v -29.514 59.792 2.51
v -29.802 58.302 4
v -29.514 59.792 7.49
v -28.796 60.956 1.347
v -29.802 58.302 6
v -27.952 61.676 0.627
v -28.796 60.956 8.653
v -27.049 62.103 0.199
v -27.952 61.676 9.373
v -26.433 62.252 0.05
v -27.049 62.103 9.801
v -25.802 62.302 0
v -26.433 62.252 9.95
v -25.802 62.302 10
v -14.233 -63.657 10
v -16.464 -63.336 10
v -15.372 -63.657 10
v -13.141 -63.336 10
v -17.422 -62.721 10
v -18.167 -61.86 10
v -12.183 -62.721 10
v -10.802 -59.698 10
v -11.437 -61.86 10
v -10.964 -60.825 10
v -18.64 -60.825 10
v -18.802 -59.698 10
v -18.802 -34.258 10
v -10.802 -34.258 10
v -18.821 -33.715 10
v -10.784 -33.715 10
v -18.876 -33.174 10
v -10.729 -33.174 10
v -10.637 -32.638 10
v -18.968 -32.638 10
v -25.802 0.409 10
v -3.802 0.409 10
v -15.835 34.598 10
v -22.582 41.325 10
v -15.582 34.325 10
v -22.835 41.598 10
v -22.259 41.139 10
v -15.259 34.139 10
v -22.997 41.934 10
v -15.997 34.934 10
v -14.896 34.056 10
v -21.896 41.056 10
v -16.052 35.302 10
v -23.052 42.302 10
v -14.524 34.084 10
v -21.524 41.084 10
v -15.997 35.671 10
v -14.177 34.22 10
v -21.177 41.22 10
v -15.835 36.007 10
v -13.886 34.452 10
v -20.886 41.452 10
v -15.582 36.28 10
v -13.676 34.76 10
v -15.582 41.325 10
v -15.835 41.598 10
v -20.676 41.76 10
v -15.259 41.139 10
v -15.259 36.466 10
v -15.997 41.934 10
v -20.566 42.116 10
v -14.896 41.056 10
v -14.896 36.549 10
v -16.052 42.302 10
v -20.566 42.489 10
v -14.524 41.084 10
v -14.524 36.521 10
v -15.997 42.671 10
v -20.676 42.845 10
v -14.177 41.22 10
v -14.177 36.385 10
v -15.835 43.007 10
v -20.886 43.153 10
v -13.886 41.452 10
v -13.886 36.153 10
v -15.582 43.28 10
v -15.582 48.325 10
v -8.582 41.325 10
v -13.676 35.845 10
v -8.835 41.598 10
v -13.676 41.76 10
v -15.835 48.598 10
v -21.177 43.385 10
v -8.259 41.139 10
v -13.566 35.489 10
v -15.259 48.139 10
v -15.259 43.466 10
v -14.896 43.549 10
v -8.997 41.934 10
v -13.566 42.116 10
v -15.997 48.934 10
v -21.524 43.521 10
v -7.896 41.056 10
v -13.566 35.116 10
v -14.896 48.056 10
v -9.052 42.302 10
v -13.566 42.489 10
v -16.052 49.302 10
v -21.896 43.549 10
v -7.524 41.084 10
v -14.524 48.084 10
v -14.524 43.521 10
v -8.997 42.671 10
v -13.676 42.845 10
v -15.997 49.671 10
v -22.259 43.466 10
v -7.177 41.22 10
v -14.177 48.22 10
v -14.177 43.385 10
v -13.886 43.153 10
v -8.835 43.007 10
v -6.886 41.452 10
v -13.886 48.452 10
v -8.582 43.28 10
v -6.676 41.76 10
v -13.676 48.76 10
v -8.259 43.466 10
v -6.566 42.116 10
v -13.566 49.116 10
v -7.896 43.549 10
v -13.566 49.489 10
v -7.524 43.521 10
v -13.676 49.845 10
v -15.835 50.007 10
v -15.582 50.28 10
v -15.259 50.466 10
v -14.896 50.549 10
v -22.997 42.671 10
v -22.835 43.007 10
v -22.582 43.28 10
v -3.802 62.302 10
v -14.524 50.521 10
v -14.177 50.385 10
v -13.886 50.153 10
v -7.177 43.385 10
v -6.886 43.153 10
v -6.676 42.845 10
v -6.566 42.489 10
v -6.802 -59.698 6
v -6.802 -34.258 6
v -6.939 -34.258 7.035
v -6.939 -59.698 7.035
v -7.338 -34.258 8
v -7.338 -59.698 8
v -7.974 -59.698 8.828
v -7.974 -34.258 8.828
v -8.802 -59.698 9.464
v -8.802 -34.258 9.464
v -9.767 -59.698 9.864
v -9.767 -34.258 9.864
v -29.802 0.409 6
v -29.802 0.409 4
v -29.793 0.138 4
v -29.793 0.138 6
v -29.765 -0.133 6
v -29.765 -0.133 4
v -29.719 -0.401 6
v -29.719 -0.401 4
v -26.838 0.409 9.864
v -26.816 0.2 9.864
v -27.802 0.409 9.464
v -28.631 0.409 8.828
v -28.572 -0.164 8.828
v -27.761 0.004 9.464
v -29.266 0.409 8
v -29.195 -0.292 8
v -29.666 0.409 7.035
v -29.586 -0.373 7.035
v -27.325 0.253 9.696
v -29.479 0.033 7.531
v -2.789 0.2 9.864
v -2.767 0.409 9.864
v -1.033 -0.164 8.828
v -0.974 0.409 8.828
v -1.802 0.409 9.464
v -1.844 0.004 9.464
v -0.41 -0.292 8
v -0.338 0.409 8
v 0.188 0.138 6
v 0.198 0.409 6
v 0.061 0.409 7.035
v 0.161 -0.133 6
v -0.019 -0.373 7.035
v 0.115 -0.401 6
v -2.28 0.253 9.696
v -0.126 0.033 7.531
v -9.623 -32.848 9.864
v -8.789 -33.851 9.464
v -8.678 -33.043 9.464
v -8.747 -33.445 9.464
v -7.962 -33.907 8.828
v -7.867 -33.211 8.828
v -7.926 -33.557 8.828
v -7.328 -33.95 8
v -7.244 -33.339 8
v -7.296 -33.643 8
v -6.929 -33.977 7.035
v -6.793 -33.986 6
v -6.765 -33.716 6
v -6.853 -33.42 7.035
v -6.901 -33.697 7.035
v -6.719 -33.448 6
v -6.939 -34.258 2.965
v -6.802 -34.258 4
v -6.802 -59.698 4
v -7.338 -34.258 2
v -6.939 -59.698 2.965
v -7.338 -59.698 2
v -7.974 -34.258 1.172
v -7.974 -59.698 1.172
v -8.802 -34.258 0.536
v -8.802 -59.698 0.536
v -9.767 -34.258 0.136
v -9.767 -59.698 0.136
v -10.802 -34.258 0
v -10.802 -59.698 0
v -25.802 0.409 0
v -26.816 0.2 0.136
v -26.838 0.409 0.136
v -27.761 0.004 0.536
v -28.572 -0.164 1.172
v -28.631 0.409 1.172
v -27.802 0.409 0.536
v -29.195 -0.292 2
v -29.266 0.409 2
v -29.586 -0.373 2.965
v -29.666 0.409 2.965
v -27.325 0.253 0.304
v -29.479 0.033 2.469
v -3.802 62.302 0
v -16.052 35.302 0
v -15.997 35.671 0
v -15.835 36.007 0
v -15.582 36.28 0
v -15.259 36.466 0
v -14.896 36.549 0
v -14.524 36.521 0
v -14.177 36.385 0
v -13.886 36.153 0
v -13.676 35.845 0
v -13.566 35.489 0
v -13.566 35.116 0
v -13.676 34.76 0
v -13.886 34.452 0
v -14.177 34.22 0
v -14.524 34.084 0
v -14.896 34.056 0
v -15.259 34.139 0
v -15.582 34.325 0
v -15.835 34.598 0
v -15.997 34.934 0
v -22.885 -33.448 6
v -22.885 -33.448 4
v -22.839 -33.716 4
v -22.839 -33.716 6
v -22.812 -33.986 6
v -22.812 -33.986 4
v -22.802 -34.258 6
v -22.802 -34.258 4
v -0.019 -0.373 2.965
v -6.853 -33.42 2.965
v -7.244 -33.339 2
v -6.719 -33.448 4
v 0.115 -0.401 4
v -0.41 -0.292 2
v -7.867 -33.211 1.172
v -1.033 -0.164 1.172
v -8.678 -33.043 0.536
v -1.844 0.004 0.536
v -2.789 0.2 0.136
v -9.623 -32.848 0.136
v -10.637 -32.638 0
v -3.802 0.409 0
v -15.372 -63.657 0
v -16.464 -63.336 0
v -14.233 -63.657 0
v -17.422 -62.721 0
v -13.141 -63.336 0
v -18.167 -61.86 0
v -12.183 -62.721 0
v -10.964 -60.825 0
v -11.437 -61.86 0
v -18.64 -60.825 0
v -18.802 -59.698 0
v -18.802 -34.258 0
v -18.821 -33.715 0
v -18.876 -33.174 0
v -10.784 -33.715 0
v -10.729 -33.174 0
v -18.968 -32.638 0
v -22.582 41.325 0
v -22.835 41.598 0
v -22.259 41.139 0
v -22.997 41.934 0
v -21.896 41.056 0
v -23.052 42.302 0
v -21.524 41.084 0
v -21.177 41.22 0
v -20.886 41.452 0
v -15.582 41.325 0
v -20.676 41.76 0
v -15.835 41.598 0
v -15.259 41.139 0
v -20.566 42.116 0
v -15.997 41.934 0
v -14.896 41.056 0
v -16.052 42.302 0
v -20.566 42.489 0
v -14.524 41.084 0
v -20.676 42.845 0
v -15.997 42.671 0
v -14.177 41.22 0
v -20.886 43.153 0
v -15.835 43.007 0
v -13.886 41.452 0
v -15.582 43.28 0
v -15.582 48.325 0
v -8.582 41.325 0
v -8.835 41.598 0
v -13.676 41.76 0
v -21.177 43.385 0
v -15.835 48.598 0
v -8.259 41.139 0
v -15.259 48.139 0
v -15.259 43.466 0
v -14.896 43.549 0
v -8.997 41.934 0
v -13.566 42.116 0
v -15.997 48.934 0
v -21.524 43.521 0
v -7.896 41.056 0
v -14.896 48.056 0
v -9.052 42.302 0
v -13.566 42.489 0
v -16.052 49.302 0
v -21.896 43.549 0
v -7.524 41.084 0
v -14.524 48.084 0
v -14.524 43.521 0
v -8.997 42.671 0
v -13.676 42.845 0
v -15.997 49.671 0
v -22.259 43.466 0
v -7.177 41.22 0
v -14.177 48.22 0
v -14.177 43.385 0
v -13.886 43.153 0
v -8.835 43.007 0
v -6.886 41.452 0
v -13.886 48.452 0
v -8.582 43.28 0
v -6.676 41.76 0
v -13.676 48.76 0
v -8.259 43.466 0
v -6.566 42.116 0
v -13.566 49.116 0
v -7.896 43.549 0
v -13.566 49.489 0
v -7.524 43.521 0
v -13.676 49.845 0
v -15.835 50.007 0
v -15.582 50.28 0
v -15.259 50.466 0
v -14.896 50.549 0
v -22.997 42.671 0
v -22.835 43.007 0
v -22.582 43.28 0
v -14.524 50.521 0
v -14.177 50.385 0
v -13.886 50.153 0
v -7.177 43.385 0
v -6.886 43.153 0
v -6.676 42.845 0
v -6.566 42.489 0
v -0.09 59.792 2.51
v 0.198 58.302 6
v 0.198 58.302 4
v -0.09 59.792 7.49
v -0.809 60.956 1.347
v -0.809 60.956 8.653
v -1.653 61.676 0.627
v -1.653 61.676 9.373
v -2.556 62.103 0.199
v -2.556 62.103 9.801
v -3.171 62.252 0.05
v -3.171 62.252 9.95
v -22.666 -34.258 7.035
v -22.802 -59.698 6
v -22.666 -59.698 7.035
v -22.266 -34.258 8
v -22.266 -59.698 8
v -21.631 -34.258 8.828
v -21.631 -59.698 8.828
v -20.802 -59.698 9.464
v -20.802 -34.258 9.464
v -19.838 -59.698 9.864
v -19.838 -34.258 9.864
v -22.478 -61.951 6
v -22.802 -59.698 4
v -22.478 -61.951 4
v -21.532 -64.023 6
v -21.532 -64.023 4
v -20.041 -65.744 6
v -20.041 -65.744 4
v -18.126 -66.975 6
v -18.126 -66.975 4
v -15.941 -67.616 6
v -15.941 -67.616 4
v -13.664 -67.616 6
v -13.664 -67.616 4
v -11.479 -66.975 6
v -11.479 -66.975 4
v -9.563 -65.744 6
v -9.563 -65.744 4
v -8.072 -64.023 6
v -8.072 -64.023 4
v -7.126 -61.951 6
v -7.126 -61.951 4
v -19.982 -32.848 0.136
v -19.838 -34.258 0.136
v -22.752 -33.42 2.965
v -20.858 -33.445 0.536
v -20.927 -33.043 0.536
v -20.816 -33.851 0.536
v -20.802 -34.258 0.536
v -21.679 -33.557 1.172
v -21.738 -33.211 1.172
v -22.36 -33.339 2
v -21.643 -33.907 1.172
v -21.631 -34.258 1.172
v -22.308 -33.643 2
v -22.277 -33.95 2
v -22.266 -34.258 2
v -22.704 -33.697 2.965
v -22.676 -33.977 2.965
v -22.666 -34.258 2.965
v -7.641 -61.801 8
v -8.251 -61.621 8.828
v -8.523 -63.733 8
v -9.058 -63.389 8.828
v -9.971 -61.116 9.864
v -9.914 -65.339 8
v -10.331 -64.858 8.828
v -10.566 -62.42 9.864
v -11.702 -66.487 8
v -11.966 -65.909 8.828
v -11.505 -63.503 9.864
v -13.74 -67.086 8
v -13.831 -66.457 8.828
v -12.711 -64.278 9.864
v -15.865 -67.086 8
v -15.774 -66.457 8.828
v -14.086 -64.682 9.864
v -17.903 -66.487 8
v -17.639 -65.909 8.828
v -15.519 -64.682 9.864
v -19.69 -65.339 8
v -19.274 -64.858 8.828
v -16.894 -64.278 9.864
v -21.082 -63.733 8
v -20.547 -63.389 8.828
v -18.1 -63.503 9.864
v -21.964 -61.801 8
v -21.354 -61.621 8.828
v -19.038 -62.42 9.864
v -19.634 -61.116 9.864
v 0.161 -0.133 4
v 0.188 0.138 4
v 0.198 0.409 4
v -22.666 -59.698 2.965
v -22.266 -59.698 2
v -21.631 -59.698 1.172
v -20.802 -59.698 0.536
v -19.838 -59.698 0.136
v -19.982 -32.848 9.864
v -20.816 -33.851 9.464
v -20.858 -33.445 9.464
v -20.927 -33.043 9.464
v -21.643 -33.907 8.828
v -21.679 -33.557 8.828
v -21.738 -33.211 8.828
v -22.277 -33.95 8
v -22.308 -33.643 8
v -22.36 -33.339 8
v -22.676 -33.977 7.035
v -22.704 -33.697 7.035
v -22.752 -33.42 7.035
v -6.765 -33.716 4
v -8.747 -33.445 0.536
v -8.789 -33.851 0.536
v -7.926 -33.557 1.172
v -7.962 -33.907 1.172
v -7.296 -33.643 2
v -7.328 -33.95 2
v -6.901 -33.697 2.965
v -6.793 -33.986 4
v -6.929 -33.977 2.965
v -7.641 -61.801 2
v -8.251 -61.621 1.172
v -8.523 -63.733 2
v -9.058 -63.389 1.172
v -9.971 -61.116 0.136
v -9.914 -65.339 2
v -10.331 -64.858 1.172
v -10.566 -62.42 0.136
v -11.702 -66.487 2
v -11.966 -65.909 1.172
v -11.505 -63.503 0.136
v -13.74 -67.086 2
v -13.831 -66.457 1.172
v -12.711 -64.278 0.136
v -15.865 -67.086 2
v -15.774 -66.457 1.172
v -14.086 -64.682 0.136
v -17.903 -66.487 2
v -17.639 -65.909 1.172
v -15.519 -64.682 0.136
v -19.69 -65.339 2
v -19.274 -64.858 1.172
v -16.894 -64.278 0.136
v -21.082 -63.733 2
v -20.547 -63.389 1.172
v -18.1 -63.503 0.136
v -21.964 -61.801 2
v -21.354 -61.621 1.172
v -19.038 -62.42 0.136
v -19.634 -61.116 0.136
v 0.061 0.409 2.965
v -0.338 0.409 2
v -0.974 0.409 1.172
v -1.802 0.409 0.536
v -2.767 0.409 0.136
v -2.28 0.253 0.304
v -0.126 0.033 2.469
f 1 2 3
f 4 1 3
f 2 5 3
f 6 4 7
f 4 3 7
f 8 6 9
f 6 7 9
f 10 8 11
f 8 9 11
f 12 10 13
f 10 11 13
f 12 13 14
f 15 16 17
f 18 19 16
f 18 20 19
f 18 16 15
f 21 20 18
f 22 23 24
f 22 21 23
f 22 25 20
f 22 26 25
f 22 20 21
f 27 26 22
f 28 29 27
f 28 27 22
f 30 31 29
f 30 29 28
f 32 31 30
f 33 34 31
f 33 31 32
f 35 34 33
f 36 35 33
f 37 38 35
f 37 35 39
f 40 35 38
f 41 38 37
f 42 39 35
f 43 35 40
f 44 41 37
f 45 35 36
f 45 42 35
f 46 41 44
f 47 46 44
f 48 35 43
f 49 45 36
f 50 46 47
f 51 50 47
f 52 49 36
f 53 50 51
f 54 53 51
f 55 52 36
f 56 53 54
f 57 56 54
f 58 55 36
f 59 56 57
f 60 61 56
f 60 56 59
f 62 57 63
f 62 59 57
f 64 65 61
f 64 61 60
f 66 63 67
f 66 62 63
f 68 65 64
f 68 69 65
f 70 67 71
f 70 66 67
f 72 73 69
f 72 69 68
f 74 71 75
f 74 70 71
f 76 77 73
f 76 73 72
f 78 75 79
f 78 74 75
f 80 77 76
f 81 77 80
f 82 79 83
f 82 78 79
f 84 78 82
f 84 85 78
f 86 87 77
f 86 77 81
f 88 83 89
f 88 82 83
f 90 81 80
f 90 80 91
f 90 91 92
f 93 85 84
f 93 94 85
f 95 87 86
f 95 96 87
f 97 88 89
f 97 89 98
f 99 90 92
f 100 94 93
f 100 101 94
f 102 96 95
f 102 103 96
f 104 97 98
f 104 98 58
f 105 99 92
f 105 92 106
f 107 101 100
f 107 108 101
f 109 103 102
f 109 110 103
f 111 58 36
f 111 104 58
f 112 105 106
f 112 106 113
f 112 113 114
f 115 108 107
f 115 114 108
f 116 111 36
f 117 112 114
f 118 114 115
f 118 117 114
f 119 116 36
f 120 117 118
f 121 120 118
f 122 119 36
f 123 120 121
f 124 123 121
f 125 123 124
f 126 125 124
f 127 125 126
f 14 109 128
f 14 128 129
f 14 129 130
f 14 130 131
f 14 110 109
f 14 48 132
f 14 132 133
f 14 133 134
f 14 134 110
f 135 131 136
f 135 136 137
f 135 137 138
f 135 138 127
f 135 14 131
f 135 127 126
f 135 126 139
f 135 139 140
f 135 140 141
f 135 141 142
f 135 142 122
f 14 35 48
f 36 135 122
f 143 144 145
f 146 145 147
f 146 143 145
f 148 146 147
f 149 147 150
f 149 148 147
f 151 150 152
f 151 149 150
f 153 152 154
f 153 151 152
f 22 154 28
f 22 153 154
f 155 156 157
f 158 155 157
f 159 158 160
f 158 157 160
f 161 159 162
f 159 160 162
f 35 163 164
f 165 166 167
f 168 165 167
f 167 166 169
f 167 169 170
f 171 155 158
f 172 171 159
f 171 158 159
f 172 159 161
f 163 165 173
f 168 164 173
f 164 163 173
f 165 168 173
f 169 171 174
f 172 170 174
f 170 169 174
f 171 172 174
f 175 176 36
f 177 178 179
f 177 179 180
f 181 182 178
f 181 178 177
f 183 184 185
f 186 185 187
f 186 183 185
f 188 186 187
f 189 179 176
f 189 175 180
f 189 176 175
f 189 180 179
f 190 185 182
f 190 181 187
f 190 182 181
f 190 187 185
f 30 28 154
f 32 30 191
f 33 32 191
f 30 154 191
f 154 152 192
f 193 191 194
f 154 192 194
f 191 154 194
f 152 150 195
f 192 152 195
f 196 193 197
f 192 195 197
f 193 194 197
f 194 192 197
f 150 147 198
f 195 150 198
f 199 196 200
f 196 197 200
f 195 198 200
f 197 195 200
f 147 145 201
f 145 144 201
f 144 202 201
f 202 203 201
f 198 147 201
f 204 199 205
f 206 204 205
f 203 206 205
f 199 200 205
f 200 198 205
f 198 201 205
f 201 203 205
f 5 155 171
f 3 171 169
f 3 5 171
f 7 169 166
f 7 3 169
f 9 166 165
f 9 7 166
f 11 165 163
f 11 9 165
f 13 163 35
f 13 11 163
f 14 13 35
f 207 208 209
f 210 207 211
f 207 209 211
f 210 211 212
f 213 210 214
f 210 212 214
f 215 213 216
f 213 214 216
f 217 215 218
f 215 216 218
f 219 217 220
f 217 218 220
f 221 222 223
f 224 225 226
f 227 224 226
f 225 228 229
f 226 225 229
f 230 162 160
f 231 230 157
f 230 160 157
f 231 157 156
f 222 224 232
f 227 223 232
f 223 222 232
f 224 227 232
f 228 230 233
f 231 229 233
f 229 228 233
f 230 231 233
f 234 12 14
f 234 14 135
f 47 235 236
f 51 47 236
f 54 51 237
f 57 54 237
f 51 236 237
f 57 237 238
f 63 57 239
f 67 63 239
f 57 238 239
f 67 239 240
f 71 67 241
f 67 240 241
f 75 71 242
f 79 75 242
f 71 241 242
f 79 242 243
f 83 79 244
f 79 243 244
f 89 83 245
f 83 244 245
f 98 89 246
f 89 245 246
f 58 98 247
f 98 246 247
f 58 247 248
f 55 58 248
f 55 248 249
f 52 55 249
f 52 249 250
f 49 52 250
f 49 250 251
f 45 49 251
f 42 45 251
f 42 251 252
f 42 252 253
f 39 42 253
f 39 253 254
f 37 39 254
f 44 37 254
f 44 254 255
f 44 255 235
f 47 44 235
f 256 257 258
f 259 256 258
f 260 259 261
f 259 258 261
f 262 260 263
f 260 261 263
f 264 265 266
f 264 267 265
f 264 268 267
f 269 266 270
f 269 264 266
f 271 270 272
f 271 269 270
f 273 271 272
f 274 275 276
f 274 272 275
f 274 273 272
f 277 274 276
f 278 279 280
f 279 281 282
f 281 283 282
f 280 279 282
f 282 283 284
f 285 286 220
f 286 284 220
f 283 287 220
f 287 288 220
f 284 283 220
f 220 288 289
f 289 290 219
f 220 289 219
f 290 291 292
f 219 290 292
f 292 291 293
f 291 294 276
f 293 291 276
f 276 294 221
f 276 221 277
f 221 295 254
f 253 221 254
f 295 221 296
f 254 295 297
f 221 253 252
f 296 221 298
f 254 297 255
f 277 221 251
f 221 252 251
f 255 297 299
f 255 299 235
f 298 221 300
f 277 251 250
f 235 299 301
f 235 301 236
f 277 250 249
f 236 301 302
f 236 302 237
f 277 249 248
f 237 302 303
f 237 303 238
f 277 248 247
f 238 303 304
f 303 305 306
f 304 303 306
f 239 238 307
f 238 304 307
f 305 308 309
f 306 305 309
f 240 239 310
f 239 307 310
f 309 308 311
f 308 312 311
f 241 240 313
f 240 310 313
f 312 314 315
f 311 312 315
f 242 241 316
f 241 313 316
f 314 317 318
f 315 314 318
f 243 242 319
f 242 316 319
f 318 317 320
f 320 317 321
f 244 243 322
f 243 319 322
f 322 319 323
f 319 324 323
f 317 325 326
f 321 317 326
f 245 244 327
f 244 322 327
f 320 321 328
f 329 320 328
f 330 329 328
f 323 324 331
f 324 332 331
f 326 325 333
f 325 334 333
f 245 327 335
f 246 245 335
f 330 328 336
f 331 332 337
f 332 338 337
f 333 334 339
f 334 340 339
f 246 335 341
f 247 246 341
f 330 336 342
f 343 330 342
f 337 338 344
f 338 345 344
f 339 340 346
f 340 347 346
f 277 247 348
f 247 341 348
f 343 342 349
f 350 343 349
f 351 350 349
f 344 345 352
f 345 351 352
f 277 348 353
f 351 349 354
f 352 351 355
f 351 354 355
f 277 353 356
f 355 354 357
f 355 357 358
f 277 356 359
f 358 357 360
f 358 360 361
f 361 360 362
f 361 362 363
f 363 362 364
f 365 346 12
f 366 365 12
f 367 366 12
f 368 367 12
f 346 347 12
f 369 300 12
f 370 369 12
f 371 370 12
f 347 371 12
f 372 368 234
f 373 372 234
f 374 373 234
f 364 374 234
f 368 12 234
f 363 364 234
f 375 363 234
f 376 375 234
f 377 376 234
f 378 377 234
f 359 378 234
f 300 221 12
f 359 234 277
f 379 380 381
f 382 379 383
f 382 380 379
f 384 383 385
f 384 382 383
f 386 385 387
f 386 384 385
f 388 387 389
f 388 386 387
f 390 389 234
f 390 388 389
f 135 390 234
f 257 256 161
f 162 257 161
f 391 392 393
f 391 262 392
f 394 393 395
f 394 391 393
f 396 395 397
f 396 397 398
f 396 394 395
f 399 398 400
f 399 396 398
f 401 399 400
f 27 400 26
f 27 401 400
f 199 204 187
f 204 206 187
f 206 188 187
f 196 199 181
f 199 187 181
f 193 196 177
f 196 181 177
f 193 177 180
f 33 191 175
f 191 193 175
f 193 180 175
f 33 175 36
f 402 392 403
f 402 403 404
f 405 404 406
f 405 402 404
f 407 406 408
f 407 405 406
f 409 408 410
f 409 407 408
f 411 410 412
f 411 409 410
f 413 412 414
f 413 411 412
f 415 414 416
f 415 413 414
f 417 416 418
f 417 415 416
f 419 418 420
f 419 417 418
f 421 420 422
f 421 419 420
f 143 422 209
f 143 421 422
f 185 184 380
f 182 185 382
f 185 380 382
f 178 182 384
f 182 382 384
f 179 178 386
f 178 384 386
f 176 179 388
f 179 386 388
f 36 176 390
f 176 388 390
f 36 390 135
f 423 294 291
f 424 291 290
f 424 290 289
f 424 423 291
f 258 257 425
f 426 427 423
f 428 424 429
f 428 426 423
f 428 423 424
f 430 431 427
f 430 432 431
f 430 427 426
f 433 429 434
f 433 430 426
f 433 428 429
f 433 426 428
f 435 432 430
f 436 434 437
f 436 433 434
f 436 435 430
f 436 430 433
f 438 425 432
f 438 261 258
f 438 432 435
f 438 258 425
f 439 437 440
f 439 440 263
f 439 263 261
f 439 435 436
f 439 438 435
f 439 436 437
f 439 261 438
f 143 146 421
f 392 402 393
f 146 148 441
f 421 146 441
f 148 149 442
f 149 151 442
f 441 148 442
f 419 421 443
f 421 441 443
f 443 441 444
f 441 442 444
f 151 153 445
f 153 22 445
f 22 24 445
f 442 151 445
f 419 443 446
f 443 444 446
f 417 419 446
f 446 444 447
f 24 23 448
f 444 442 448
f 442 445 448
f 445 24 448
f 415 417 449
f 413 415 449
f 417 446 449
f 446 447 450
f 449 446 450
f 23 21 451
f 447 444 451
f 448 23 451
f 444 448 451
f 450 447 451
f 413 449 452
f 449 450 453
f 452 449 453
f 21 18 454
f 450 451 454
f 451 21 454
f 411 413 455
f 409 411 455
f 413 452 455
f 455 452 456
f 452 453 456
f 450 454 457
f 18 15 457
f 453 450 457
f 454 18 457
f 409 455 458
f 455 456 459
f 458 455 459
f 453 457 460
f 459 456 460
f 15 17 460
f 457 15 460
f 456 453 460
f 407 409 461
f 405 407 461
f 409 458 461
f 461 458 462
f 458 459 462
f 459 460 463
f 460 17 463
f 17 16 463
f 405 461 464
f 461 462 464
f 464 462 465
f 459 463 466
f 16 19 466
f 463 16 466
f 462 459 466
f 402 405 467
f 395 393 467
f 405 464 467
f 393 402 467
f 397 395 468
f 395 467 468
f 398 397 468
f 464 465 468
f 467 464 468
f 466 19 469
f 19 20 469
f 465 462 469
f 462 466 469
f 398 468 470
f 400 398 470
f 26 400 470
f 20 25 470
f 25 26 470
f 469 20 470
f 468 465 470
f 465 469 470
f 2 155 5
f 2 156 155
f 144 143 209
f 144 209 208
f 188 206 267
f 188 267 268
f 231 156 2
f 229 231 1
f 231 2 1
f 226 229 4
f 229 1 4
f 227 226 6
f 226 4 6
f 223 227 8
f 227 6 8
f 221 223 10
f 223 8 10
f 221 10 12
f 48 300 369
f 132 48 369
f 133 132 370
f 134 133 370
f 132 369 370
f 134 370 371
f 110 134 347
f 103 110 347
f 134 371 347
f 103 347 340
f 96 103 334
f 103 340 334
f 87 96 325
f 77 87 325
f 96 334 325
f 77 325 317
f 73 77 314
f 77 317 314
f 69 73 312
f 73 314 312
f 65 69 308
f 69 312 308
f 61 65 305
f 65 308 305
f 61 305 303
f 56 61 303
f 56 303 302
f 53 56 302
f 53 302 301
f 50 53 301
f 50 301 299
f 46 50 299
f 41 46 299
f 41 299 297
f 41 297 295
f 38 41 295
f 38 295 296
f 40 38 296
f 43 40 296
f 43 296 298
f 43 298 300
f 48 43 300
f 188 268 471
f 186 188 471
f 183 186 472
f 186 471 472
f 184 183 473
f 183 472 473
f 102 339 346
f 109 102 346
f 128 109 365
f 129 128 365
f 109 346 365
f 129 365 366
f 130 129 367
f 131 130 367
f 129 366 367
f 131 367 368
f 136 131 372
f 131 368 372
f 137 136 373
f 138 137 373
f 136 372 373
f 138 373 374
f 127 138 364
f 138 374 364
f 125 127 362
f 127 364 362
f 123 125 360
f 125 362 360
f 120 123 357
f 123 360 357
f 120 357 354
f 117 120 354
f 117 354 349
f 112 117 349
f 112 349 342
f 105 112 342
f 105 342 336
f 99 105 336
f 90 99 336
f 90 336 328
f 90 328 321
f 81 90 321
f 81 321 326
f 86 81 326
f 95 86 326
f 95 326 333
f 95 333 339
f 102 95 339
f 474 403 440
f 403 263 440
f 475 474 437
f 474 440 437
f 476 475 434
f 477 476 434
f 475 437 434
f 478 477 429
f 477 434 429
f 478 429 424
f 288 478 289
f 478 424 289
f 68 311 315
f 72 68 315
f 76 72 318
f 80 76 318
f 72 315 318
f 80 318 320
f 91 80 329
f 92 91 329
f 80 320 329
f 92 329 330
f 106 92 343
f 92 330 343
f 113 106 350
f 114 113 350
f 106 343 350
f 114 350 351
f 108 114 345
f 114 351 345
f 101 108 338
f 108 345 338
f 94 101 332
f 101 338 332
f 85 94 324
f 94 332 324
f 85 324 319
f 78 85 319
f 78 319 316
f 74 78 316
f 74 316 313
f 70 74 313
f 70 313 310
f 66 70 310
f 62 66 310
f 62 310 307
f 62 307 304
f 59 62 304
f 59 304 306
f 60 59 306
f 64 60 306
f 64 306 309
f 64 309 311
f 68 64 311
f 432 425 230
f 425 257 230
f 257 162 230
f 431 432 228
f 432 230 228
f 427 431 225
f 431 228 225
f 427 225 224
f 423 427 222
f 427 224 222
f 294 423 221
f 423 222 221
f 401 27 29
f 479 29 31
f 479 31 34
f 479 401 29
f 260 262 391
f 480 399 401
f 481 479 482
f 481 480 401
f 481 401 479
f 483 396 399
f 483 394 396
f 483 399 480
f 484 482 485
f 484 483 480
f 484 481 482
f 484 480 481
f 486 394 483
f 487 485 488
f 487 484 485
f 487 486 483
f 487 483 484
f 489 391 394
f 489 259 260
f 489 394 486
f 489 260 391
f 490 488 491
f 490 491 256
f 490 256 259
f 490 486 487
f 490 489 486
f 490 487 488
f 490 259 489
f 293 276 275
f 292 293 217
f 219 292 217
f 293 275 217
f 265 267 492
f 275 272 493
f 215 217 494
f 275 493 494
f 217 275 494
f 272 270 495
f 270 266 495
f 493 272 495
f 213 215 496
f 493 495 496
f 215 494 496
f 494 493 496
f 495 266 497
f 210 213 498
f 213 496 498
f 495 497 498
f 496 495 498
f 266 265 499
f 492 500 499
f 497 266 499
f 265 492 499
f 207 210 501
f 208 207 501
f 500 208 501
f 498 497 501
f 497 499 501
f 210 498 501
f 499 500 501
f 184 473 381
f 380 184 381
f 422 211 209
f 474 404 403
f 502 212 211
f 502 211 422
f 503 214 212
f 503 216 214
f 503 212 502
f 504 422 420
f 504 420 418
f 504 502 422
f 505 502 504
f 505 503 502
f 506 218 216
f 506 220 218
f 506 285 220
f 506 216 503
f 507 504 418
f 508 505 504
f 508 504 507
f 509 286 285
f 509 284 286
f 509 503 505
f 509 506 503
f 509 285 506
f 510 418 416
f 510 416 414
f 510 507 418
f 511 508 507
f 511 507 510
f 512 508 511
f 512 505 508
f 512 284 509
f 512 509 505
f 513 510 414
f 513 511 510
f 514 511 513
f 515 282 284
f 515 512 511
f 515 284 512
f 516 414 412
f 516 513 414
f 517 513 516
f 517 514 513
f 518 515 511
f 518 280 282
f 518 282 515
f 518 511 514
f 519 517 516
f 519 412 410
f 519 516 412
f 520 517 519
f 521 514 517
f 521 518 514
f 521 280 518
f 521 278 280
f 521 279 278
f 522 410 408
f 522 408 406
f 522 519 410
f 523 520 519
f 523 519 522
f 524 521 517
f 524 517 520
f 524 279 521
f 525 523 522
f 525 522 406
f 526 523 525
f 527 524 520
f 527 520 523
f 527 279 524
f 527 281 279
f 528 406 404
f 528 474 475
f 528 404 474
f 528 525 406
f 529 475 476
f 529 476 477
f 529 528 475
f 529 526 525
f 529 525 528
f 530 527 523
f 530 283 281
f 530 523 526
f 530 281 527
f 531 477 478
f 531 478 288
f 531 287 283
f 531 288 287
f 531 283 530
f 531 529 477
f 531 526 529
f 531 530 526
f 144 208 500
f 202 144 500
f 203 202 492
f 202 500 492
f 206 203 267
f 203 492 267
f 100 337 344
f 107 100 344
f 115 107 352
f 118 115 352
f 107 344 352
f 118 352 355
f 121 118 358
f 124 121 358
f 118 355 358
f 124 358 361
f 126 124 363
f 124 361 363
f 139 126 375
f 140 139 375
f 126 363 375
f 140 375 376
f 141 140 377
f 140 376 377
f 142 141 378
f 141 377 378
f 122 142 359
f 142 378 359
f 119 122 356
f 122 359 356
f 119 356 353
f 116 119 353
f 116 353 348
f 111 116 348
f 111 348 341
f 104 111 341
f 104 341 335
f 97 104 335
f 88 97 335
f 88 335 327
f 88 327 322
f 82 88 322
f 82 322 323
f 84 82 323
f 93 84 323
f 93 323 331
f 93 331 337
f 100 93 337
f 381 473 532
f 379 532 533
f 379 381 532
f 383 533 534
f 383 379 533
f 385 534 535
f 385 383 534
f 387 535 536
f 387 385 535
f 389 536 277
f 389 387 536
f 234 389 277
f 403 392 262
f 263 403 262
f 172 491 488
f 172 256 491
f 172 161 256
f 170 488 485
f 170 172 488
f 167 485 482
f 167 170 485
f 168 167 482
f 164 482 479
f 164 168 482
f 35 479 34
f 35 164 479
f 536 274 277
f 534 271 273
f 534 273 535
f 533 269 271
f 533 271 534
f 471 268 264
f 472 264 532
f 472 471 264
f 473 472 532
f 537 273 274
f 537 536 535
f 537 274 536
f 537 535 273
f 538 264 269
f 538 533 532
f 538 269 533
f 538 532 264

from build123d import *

# Parameters (mm, degrees)
SKETCH2_W             = 30
SKETCH2_H             = 130
BOSS_EXTRUDE1_DEPTH   = 10
M3X0_5_TAPPED_HOLE2_D = 2.5
CUT_EXTRUDE3_DEPTH    = 75.64013832
FILLET3_RADIUS        = 8
FILLET3_LENGTH        = 10
FILLET4_R             = 4
M3X0_5_TAPPED_HOLE3_D = 2.5


with BuildPart() as part:
    # Sketch2 → Boss-Extrude1 (new body)
    with BuildSketch(Plane.XY):
        with Locations((-14.802371542, -2.697628458)):
            Rectangle(SKETCH2_W, SKETCH2_H)
    extrude(amount=BOSS_EXTRUDE1_DEPTH)

    # M3x0.5 Tapped Hole2 (through all)
    with Locations(Plane.XY.offset(10)):
        with Locations((-14.802371542, 35.302371542), (-21.802371542, 42.302371542), (-14.802371542, 49.302371542), (-7.802371542, 42.302371542)):
            Hole(M3X0_5_TAPPED_HOLE2_D / 2)

    # Sketch6 → Cut-Extrude3 (cut, through all)
    with BuildSketch(Plane.XY.offset(10)):
        Polygon((-29.802371542, -67.697628458), (-22.802371542, -67.697628458), (-22.802371542, -33.848814229), (-29.802371542, 0), align=None)
        Polygon((0.197628458, -67.697628458), (-6.802371542, -67.697628458), (-6.802371542, -33.848814229), (0.197628458, 0), align=None)
    extrude(amount=-CUT_EXTRUDE3_DEPTH, mode=Mode.SUBTRACT)

    # Fillet3: full round fillet: the end face becomes a half cylinder, R = half its width
    fillet3_face = Plane((-14.802371542, -67.697628458, 5), x_dir=(0, 0, 1), z_dir=(0, -1, 0))  # on the end face: x along it, z out of the body
    fillet3_slab = fillet3_face.offset(-FILLET3_RADIUS / 2) * Box(FILLET3_LENGTH, 2 * FILLET3_RADIUS, FILLET3_RADIUS, mode=Mode.PRIVATE)  # the body's end, R deep
    fillet3_round = Plane((-14.802371542, -59.697628458, 5), x_dir=(0, -1, 0), z_dir=(0, 0, 1)) * Cylinder(FILLET3_RADIUS, FILLET3_LENGTH, mode=Mode.PRIVATE)  # its axis R under the face
    add(fillet3_slab - fillet3_round, mode=Mode.SUBTRACT)

    # Fillet4
    fillet4_edges = [part.edges().sort_by_distance(p)[0] for p in [
        (0.197628458, 31.151185771, 0),
        (0.197628458, 31.151185771, 10),
        (-3.302371542, -16.924407115, 10),
        (-6.802371542, -33.848814229, 5),
        (0.197628458, 0, 5),
        (-3.302371542, -16.924407115, 0),
        (-29.802371542, 31.151185771, 10),
        (-26.302371542, -16.924407115, 10),
        (-29.802371542, 0, 5),
        (-22.802371542, -33.848814229, 5),
        (-26.302371542, -16.924407115, 0),
        (-29.802371542, 31.151185771, 0),
        (-22.802371542, -46.773221344, 10),
        (-22.802371542, -46.773221344, 0),
        (-6.802371542, -46.773221344, 10),
        (-6.802371542, -46.773221344, 0),
        (-14.802371542, -67.697628458, 0),
        (-14.802371542, -67.697628458, 10),
        (-29.802371542, 62.302371542, 5),
        (0.197628458, 62.302371542, 5),
    ]]
    fillet(fillet4_edges, radius=FILLET4_R)

    # M3x0.5 Tapped Hole3 (through all)
    with Locations(Plane.XY.offset(10)):
        with Locations((-14.802371542, 42.302371542)):
            Hole(M3X0_5_TAPPED_HOLE3_D / 2)


solid = part.part
